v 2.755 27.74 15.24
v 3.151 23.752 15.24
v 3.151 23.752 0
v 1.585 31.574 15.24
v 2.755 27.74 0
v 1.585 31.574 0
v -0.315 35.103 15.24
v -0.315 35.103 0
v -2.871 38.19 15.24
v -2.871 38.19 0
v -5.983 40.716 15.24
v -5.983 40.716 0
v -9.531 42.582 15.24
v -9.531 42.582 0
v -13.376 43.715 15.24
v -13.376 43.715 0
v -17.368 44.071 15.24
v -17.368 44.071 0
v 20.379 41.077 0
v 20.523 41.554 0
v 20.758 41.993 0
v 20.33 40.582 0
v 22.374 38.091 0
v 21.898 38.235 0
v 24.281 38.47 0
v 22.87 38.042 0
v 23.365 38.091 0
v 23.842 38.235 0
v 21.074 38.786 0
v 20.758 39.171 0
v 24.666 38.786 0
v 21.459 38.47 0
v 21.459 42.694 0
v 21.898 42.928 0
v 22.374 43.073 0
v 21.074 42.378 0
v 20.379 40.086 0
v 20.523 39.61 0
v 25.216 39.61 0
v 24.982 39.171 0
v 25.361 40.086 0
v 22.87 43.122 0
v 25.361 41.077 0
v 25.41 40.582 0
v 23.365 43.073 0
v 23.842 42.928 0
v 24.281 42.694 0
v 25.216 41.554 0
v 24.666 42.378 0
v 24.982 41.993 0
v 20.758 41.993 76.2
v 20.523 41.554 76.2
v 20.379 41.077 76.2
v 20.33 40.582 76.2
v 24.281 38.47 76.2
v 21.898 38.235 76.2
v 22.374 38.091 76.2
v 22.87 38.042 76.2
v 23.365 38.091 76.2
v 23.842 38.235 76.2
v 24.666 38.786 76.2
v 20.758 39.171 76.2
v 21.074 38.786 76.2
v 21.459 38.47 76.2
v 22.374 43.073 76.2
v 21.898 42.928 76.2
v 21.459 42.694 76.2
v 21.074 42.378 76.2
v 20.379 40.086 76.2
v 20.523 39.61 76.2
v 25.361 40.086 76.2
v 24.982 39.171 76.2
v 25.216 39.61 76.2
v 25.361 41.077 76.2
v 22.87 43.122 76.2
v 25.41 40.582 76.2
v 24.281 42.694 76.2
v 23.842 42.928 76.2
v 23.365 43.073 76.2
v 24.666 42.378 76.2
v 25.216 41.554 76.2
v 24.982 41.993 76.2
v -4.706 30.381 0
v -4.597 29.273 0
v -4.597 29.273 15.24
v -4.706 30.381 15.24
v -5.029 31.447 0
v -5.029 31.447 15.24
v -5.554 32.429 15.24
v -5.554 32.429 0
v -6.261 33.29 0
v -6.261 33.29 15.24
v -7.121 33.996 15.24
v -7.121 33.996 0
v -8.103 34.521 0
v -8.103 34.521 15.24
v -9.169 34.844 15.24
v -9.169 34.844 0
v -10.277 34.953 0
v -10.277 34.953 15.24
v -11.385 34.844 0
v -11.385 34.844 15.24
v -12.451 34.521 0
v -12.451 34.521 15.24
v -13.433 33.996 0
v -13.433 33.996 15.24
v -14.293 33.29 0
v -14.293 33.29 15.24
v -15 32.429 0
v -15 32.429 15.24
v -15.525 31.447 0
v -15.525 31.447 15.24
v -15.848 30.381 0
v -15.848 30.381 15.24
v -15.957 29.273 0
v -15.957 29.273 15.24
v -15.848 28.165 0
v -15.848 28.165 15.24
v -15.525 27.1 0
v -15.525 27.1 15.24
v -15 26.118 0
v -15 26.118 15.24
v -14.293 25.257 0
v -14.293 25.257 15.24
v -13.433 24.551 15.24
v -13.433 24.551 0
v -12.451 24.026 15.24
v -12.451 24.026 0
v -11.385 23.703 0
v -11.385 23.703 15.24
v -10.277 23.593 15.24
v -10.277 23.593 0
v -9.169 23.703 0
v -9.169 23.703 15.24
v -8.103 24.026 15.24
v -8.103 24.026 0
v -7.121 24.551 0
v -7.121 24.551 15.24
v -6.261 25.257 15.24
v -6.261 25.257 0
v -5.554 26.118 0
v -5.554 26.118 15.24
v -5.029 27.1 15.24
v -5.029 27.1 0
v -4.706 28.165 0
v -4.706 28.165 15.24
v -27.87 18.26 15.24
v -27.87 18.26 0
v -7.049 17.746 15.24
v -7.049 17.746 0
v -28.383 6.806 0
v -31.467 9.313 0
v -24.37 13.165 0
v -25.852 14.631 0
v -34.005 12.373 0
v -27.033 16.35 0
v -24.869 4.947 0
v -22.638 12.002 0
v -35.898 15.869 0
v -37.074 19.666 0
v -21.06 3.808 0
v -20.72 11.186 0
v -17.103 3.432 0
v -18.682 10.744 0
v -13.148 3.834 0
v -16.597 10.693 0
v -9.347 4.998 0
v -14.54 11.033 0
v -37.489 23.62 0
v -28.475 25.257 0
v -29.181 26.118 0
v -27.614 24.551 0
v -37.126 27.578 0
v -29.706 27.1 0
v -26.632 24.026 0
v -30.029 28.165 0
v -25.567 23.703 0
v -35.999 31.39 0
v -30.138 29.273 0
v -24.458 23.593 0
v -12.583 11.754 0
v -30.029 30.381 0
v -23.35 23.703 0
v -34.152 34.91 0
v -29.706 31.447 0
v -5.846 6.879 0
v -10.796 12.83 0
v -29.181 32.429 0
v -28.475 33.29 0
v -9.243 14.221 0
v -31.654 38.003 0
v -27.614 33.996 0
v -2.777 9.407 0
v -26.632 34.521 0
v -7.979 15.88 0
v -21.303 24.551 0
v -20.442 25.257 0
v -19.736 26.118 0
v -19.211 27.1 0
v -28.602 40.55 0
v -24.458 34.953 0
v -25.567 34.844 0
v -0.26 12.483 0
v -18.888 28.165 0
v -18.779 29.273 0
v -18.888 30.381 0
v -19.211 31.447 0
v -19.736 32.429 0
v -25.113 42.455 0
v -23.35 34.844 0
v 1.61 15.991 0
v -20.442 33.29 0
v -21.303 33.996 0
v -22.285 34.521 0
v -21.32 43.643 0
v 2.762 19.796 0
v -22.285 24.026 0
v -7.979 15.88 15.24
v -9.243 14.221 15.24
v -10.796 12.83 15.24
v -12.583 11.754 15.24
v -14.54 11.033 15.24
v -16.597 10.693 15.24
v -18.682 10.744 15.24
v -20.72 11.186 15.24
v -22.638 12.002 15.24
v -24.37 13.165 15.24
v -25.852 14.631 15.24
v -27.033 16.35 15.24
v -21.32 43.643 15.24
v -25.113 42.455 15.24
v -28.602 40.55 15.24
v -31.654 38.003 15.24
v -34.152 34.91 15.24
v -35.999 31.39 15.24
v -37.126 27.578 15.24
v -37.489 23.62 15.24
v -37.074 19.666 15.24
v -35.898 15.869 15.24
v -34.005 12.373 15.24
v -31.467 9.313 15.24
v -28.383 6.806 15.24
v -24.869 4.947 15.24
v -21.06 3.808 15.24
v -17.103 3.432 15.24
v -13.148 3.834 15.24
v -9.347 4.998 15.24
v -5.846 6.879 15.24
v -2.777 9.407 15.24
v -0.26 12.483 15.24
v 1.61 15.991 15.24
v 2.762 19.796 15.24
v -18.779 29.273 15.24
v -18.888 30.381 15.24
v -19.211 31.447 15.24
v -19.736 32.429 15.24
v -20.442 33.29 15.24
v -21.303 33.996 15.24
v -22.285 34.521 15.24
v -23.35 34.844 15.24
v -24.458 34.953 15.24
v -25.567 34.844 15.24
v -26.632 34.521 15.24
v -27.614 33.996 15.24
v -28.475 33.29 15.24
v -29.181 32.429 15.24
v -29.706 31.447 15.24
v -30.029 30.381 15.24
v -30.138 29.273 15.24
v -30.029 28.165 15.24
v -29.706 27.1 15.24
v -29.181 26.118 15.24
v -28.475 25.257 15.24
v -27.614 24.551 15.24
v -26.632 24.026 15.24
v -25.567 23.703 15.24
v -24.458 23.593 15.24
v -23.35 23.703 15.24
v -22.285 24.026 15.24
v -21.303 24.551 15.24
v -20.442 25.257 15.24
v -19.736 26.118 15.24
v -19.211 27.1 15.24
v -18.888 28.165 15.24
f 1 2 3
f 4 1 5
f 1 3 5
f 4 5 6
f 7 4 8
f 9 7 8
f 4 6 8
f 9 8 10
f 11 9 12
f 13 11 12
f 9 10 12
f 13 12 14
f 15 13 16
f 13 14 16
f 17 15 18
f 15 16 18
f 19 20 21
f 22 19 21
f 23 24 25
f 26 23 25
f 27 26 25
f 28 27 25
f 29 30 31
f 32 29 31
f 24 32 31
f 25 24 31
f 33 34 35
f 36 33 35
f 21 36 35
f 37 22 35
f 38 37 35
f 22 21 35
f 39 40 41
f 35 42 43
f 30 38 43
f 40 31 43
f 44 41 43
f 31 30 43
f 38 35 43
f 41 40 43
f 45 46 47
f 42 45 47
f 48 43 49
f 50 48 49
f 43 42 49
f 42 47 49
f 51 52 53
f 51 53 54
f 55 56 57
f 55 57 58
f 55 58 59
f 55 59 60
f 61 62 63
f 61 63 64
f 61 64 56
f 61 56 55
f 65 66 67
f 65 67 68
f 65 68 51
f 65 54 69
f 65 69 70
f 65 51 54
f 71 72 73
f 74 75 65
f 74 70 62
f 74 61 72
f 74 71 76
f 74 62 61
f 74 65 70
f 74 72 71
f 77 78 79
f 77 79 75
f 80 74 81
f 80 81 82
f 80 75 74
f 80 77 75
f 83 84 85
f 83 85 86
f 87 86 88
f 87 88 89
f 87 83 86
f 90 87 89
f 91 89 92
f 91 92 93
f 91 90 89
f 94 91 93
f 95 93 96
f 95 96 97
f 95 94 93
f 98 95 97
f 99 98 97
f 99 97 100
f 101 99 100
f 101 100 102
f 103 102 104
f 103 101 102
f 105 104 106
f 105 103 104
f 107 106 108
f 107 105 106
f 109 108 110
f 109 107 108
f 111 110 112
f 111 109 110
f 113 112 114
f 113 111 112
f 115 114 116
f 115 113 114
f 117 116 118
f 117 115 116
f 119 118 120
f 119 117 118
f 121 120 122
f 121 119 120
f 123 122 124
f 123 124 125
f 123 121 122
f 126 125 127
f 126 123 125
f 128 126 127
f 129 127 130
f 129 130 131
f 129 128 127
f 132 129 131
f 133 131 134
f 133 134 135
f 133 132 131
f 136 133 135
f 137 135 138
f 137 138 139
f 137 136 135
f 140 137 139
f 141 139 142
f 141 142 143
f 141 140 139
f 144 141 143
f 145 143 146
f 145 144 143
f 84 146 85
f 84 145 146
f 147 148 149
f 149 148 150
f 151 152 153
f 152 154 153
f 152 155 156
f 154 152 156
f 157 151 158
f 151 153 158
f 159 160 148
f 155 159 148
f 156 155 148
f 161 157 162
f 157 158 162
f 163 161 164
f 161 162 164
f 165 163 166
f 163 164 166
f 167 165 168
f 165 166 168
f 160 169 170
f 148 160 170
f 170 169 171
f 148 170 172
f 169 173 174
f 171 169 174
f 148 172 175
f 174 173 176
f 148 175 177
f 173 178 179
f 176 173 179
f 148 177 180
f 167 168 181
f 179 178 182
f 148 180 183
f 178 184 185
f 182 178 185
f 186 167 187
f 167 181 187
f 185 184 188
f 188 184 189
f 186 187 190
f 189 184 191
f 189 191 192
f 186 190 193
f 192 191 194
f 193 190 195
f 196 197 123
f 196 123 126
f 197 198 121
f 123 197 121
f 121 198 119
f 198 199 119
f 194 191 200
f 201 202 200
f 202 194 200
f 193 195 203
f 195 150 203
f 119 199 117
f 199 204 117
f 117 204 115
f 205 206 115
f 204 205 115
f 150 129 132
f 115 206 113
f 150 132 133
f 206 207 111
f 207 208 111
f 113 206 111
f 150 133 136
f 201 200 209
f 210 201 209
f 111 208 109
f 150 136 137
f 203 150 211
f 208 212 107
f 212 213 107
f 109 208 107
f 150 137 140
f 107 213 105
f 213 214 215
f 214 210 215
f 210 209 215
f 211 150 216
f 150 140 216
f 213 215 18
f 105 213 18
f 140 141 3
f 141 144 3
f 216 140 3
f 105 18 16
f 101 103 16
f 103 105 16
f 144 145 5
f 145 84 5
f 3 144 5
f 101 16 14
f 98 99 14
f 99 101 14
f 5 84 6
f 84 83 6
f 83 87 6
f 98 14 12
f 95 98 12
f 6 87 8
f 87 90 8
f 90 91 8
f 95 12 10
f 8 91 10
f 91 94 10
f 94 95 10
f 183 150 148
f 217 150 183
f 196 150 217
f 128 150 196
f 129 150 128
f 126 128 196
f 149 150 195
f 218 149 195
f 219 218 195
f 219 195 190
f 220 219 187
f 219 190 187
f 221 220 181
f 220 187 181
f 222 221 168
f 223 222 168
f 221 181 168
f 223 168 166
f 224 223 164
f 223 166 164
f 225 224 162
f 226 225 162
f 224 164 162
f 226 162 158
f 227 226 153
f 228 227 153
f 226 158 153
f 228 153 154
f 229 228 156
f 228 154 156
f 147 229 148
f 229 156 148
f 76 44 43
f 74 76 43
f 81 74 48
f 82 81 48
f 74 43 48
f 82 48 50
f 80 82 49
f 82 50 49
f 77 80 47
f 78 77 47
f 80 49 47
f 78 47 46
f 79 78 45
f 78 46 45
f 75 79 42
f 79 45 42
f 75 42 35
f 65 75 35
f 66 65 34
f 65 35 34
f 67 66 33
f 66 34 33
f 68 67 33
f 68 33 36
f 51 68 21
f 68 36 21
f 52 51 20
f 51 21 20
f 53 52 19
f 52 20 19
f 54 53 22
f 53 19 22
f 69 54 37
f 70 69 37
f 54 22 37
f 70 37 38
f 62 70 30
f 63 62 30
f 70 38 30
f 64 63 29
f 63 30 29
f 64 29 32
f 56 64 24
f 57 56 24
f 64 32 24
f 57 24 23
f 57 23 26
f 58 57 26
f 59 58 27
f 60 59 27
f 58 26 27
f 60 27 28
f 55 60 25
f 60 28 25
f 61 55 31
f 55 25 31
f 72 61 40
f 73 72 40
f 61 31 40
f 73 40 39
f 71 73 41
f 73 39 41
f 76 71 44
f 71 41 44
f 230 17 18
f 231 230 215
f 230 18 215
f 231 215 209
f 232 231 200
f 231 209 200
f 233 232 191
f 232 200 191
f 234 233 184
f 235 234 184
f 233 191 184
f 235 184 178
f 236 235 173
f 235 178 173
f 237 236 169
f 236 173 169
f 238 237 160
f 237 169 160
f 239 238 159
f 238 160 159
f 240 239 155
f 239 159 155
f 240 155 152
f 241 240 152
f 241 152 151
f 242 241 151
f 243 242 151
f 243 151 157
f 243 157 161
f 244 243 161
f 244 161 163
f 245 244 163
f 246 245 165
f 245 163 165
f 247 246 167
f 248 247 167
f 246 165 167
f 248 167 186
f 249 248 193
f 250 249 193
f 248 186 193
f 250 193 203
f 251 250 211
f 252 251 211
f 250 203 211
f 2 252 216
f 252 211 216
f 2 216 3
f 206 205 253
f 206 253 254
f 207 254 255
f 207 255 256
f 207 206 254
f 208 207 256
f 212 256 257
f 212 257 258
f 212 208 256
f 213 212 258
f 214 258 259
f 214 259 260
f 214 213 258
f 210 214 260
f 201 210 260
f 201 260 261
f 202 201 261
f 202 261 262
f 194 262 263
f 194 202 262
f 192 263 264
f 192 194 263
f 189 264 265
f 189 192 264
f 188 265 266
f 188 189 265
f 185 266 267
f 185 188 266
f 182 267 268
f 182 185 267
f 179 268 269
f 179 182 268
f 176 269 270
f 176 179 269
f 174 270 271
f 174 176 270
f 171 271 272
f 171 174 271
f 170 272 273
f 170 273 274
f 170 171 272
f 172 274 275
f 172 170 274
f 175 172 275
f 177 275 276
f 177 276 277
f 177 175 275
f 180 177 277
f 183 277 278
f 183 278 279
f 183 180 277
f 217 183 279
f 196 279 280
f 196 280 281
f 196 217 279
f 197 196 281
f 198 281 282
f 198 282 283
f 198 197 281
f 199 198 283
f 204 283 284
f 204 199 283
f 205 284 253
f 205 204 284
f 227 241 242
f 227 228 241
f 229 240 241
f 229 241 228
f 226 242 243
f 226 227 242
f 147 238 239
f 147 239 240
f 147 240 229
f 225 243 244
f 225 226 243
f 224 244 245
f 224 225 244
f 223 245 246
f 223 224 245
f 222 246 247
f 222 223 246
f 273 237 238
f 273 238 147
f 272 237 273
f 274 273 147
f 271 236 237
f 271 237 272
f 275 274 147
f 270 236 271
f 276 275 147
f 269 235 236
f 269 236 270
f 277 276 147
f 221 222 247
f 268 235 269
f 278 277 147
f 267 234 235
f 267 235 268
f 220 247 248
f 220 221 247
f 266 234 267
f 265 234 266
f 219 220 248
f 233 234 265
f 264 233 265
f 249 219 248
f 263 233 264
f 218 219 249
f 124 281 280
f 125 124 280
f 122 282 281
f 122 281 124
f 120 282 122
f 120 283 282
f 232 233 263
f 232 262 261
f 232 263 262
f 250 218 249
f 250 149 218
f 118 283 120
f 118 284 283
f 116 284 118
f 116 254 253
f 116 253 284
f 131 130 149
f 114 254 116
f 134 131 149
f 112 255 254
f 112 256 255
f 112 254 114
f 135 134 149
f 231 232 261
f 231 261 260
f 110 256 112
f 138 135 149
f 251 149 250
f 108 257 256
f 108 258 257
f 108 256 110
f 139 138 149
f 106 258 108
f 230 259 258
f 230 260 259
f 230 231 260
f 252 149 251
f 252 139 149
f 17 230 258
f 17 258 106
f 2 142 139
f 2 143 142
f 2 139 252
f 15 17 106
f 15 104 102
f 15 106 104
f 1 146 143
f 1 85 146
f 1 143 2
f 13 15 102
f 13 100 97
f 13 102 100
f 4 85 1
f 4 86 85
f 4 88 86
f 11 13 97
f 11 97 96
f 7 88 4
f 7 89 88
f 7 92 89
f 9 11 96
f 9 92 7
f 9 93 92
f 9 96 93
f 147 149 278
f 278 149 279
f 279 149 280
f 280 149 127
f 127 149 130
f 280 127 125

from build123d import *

# Parameters (mm, degrees)
F0_R     = 5.679945
F1_DEPTH = 15.24
F2_R     = 2.54
F3_DEPTH = 76.2


with BuildPart() as f1:
    # F0 (on Top) → F1 (new body)
    with BuildSketch(Plane.XY):
        with BuildLine():
            ThreePointArc((-17.367772, 44.070937), (-31.467282, 9.313475), (3.150763, 23.751907))
            ThreePointArc((3.150763, 23.751907), (-2.871192, 38.190339), (-17.367772, 44.070937))
        make_face()
        with BuildLine():
            ThreePointArc((-7.048942, 17.746177), (-17.640486, 10.669144), (-27.87023, 18.259766))
            Line((-27.87023, 18.259766), (-7.048942, 17.746177))
        make_face(mode=Mode.SUBTRACT)
        with Locations((-24.458495, 29.273391)):
            Circle(F0_R, mode=Mode.SUBTRACT)
        with Locations((-10.277048, 29.273391)):
            Circle(F0_R, mode=Mode.SUBTRACT)
    extrude(amount=F1_DEPTH)


with BuildPart() as f3:
    # F2 (on Top) → F3 (new body)
    with BuildSketch(Plane.XY):
        with Locations((22.869695, 40.58183)):
            Circle(F2_R)
    extrude(amount=F3_DEPTH)


solid = Compound([f1.part, f3.part])
